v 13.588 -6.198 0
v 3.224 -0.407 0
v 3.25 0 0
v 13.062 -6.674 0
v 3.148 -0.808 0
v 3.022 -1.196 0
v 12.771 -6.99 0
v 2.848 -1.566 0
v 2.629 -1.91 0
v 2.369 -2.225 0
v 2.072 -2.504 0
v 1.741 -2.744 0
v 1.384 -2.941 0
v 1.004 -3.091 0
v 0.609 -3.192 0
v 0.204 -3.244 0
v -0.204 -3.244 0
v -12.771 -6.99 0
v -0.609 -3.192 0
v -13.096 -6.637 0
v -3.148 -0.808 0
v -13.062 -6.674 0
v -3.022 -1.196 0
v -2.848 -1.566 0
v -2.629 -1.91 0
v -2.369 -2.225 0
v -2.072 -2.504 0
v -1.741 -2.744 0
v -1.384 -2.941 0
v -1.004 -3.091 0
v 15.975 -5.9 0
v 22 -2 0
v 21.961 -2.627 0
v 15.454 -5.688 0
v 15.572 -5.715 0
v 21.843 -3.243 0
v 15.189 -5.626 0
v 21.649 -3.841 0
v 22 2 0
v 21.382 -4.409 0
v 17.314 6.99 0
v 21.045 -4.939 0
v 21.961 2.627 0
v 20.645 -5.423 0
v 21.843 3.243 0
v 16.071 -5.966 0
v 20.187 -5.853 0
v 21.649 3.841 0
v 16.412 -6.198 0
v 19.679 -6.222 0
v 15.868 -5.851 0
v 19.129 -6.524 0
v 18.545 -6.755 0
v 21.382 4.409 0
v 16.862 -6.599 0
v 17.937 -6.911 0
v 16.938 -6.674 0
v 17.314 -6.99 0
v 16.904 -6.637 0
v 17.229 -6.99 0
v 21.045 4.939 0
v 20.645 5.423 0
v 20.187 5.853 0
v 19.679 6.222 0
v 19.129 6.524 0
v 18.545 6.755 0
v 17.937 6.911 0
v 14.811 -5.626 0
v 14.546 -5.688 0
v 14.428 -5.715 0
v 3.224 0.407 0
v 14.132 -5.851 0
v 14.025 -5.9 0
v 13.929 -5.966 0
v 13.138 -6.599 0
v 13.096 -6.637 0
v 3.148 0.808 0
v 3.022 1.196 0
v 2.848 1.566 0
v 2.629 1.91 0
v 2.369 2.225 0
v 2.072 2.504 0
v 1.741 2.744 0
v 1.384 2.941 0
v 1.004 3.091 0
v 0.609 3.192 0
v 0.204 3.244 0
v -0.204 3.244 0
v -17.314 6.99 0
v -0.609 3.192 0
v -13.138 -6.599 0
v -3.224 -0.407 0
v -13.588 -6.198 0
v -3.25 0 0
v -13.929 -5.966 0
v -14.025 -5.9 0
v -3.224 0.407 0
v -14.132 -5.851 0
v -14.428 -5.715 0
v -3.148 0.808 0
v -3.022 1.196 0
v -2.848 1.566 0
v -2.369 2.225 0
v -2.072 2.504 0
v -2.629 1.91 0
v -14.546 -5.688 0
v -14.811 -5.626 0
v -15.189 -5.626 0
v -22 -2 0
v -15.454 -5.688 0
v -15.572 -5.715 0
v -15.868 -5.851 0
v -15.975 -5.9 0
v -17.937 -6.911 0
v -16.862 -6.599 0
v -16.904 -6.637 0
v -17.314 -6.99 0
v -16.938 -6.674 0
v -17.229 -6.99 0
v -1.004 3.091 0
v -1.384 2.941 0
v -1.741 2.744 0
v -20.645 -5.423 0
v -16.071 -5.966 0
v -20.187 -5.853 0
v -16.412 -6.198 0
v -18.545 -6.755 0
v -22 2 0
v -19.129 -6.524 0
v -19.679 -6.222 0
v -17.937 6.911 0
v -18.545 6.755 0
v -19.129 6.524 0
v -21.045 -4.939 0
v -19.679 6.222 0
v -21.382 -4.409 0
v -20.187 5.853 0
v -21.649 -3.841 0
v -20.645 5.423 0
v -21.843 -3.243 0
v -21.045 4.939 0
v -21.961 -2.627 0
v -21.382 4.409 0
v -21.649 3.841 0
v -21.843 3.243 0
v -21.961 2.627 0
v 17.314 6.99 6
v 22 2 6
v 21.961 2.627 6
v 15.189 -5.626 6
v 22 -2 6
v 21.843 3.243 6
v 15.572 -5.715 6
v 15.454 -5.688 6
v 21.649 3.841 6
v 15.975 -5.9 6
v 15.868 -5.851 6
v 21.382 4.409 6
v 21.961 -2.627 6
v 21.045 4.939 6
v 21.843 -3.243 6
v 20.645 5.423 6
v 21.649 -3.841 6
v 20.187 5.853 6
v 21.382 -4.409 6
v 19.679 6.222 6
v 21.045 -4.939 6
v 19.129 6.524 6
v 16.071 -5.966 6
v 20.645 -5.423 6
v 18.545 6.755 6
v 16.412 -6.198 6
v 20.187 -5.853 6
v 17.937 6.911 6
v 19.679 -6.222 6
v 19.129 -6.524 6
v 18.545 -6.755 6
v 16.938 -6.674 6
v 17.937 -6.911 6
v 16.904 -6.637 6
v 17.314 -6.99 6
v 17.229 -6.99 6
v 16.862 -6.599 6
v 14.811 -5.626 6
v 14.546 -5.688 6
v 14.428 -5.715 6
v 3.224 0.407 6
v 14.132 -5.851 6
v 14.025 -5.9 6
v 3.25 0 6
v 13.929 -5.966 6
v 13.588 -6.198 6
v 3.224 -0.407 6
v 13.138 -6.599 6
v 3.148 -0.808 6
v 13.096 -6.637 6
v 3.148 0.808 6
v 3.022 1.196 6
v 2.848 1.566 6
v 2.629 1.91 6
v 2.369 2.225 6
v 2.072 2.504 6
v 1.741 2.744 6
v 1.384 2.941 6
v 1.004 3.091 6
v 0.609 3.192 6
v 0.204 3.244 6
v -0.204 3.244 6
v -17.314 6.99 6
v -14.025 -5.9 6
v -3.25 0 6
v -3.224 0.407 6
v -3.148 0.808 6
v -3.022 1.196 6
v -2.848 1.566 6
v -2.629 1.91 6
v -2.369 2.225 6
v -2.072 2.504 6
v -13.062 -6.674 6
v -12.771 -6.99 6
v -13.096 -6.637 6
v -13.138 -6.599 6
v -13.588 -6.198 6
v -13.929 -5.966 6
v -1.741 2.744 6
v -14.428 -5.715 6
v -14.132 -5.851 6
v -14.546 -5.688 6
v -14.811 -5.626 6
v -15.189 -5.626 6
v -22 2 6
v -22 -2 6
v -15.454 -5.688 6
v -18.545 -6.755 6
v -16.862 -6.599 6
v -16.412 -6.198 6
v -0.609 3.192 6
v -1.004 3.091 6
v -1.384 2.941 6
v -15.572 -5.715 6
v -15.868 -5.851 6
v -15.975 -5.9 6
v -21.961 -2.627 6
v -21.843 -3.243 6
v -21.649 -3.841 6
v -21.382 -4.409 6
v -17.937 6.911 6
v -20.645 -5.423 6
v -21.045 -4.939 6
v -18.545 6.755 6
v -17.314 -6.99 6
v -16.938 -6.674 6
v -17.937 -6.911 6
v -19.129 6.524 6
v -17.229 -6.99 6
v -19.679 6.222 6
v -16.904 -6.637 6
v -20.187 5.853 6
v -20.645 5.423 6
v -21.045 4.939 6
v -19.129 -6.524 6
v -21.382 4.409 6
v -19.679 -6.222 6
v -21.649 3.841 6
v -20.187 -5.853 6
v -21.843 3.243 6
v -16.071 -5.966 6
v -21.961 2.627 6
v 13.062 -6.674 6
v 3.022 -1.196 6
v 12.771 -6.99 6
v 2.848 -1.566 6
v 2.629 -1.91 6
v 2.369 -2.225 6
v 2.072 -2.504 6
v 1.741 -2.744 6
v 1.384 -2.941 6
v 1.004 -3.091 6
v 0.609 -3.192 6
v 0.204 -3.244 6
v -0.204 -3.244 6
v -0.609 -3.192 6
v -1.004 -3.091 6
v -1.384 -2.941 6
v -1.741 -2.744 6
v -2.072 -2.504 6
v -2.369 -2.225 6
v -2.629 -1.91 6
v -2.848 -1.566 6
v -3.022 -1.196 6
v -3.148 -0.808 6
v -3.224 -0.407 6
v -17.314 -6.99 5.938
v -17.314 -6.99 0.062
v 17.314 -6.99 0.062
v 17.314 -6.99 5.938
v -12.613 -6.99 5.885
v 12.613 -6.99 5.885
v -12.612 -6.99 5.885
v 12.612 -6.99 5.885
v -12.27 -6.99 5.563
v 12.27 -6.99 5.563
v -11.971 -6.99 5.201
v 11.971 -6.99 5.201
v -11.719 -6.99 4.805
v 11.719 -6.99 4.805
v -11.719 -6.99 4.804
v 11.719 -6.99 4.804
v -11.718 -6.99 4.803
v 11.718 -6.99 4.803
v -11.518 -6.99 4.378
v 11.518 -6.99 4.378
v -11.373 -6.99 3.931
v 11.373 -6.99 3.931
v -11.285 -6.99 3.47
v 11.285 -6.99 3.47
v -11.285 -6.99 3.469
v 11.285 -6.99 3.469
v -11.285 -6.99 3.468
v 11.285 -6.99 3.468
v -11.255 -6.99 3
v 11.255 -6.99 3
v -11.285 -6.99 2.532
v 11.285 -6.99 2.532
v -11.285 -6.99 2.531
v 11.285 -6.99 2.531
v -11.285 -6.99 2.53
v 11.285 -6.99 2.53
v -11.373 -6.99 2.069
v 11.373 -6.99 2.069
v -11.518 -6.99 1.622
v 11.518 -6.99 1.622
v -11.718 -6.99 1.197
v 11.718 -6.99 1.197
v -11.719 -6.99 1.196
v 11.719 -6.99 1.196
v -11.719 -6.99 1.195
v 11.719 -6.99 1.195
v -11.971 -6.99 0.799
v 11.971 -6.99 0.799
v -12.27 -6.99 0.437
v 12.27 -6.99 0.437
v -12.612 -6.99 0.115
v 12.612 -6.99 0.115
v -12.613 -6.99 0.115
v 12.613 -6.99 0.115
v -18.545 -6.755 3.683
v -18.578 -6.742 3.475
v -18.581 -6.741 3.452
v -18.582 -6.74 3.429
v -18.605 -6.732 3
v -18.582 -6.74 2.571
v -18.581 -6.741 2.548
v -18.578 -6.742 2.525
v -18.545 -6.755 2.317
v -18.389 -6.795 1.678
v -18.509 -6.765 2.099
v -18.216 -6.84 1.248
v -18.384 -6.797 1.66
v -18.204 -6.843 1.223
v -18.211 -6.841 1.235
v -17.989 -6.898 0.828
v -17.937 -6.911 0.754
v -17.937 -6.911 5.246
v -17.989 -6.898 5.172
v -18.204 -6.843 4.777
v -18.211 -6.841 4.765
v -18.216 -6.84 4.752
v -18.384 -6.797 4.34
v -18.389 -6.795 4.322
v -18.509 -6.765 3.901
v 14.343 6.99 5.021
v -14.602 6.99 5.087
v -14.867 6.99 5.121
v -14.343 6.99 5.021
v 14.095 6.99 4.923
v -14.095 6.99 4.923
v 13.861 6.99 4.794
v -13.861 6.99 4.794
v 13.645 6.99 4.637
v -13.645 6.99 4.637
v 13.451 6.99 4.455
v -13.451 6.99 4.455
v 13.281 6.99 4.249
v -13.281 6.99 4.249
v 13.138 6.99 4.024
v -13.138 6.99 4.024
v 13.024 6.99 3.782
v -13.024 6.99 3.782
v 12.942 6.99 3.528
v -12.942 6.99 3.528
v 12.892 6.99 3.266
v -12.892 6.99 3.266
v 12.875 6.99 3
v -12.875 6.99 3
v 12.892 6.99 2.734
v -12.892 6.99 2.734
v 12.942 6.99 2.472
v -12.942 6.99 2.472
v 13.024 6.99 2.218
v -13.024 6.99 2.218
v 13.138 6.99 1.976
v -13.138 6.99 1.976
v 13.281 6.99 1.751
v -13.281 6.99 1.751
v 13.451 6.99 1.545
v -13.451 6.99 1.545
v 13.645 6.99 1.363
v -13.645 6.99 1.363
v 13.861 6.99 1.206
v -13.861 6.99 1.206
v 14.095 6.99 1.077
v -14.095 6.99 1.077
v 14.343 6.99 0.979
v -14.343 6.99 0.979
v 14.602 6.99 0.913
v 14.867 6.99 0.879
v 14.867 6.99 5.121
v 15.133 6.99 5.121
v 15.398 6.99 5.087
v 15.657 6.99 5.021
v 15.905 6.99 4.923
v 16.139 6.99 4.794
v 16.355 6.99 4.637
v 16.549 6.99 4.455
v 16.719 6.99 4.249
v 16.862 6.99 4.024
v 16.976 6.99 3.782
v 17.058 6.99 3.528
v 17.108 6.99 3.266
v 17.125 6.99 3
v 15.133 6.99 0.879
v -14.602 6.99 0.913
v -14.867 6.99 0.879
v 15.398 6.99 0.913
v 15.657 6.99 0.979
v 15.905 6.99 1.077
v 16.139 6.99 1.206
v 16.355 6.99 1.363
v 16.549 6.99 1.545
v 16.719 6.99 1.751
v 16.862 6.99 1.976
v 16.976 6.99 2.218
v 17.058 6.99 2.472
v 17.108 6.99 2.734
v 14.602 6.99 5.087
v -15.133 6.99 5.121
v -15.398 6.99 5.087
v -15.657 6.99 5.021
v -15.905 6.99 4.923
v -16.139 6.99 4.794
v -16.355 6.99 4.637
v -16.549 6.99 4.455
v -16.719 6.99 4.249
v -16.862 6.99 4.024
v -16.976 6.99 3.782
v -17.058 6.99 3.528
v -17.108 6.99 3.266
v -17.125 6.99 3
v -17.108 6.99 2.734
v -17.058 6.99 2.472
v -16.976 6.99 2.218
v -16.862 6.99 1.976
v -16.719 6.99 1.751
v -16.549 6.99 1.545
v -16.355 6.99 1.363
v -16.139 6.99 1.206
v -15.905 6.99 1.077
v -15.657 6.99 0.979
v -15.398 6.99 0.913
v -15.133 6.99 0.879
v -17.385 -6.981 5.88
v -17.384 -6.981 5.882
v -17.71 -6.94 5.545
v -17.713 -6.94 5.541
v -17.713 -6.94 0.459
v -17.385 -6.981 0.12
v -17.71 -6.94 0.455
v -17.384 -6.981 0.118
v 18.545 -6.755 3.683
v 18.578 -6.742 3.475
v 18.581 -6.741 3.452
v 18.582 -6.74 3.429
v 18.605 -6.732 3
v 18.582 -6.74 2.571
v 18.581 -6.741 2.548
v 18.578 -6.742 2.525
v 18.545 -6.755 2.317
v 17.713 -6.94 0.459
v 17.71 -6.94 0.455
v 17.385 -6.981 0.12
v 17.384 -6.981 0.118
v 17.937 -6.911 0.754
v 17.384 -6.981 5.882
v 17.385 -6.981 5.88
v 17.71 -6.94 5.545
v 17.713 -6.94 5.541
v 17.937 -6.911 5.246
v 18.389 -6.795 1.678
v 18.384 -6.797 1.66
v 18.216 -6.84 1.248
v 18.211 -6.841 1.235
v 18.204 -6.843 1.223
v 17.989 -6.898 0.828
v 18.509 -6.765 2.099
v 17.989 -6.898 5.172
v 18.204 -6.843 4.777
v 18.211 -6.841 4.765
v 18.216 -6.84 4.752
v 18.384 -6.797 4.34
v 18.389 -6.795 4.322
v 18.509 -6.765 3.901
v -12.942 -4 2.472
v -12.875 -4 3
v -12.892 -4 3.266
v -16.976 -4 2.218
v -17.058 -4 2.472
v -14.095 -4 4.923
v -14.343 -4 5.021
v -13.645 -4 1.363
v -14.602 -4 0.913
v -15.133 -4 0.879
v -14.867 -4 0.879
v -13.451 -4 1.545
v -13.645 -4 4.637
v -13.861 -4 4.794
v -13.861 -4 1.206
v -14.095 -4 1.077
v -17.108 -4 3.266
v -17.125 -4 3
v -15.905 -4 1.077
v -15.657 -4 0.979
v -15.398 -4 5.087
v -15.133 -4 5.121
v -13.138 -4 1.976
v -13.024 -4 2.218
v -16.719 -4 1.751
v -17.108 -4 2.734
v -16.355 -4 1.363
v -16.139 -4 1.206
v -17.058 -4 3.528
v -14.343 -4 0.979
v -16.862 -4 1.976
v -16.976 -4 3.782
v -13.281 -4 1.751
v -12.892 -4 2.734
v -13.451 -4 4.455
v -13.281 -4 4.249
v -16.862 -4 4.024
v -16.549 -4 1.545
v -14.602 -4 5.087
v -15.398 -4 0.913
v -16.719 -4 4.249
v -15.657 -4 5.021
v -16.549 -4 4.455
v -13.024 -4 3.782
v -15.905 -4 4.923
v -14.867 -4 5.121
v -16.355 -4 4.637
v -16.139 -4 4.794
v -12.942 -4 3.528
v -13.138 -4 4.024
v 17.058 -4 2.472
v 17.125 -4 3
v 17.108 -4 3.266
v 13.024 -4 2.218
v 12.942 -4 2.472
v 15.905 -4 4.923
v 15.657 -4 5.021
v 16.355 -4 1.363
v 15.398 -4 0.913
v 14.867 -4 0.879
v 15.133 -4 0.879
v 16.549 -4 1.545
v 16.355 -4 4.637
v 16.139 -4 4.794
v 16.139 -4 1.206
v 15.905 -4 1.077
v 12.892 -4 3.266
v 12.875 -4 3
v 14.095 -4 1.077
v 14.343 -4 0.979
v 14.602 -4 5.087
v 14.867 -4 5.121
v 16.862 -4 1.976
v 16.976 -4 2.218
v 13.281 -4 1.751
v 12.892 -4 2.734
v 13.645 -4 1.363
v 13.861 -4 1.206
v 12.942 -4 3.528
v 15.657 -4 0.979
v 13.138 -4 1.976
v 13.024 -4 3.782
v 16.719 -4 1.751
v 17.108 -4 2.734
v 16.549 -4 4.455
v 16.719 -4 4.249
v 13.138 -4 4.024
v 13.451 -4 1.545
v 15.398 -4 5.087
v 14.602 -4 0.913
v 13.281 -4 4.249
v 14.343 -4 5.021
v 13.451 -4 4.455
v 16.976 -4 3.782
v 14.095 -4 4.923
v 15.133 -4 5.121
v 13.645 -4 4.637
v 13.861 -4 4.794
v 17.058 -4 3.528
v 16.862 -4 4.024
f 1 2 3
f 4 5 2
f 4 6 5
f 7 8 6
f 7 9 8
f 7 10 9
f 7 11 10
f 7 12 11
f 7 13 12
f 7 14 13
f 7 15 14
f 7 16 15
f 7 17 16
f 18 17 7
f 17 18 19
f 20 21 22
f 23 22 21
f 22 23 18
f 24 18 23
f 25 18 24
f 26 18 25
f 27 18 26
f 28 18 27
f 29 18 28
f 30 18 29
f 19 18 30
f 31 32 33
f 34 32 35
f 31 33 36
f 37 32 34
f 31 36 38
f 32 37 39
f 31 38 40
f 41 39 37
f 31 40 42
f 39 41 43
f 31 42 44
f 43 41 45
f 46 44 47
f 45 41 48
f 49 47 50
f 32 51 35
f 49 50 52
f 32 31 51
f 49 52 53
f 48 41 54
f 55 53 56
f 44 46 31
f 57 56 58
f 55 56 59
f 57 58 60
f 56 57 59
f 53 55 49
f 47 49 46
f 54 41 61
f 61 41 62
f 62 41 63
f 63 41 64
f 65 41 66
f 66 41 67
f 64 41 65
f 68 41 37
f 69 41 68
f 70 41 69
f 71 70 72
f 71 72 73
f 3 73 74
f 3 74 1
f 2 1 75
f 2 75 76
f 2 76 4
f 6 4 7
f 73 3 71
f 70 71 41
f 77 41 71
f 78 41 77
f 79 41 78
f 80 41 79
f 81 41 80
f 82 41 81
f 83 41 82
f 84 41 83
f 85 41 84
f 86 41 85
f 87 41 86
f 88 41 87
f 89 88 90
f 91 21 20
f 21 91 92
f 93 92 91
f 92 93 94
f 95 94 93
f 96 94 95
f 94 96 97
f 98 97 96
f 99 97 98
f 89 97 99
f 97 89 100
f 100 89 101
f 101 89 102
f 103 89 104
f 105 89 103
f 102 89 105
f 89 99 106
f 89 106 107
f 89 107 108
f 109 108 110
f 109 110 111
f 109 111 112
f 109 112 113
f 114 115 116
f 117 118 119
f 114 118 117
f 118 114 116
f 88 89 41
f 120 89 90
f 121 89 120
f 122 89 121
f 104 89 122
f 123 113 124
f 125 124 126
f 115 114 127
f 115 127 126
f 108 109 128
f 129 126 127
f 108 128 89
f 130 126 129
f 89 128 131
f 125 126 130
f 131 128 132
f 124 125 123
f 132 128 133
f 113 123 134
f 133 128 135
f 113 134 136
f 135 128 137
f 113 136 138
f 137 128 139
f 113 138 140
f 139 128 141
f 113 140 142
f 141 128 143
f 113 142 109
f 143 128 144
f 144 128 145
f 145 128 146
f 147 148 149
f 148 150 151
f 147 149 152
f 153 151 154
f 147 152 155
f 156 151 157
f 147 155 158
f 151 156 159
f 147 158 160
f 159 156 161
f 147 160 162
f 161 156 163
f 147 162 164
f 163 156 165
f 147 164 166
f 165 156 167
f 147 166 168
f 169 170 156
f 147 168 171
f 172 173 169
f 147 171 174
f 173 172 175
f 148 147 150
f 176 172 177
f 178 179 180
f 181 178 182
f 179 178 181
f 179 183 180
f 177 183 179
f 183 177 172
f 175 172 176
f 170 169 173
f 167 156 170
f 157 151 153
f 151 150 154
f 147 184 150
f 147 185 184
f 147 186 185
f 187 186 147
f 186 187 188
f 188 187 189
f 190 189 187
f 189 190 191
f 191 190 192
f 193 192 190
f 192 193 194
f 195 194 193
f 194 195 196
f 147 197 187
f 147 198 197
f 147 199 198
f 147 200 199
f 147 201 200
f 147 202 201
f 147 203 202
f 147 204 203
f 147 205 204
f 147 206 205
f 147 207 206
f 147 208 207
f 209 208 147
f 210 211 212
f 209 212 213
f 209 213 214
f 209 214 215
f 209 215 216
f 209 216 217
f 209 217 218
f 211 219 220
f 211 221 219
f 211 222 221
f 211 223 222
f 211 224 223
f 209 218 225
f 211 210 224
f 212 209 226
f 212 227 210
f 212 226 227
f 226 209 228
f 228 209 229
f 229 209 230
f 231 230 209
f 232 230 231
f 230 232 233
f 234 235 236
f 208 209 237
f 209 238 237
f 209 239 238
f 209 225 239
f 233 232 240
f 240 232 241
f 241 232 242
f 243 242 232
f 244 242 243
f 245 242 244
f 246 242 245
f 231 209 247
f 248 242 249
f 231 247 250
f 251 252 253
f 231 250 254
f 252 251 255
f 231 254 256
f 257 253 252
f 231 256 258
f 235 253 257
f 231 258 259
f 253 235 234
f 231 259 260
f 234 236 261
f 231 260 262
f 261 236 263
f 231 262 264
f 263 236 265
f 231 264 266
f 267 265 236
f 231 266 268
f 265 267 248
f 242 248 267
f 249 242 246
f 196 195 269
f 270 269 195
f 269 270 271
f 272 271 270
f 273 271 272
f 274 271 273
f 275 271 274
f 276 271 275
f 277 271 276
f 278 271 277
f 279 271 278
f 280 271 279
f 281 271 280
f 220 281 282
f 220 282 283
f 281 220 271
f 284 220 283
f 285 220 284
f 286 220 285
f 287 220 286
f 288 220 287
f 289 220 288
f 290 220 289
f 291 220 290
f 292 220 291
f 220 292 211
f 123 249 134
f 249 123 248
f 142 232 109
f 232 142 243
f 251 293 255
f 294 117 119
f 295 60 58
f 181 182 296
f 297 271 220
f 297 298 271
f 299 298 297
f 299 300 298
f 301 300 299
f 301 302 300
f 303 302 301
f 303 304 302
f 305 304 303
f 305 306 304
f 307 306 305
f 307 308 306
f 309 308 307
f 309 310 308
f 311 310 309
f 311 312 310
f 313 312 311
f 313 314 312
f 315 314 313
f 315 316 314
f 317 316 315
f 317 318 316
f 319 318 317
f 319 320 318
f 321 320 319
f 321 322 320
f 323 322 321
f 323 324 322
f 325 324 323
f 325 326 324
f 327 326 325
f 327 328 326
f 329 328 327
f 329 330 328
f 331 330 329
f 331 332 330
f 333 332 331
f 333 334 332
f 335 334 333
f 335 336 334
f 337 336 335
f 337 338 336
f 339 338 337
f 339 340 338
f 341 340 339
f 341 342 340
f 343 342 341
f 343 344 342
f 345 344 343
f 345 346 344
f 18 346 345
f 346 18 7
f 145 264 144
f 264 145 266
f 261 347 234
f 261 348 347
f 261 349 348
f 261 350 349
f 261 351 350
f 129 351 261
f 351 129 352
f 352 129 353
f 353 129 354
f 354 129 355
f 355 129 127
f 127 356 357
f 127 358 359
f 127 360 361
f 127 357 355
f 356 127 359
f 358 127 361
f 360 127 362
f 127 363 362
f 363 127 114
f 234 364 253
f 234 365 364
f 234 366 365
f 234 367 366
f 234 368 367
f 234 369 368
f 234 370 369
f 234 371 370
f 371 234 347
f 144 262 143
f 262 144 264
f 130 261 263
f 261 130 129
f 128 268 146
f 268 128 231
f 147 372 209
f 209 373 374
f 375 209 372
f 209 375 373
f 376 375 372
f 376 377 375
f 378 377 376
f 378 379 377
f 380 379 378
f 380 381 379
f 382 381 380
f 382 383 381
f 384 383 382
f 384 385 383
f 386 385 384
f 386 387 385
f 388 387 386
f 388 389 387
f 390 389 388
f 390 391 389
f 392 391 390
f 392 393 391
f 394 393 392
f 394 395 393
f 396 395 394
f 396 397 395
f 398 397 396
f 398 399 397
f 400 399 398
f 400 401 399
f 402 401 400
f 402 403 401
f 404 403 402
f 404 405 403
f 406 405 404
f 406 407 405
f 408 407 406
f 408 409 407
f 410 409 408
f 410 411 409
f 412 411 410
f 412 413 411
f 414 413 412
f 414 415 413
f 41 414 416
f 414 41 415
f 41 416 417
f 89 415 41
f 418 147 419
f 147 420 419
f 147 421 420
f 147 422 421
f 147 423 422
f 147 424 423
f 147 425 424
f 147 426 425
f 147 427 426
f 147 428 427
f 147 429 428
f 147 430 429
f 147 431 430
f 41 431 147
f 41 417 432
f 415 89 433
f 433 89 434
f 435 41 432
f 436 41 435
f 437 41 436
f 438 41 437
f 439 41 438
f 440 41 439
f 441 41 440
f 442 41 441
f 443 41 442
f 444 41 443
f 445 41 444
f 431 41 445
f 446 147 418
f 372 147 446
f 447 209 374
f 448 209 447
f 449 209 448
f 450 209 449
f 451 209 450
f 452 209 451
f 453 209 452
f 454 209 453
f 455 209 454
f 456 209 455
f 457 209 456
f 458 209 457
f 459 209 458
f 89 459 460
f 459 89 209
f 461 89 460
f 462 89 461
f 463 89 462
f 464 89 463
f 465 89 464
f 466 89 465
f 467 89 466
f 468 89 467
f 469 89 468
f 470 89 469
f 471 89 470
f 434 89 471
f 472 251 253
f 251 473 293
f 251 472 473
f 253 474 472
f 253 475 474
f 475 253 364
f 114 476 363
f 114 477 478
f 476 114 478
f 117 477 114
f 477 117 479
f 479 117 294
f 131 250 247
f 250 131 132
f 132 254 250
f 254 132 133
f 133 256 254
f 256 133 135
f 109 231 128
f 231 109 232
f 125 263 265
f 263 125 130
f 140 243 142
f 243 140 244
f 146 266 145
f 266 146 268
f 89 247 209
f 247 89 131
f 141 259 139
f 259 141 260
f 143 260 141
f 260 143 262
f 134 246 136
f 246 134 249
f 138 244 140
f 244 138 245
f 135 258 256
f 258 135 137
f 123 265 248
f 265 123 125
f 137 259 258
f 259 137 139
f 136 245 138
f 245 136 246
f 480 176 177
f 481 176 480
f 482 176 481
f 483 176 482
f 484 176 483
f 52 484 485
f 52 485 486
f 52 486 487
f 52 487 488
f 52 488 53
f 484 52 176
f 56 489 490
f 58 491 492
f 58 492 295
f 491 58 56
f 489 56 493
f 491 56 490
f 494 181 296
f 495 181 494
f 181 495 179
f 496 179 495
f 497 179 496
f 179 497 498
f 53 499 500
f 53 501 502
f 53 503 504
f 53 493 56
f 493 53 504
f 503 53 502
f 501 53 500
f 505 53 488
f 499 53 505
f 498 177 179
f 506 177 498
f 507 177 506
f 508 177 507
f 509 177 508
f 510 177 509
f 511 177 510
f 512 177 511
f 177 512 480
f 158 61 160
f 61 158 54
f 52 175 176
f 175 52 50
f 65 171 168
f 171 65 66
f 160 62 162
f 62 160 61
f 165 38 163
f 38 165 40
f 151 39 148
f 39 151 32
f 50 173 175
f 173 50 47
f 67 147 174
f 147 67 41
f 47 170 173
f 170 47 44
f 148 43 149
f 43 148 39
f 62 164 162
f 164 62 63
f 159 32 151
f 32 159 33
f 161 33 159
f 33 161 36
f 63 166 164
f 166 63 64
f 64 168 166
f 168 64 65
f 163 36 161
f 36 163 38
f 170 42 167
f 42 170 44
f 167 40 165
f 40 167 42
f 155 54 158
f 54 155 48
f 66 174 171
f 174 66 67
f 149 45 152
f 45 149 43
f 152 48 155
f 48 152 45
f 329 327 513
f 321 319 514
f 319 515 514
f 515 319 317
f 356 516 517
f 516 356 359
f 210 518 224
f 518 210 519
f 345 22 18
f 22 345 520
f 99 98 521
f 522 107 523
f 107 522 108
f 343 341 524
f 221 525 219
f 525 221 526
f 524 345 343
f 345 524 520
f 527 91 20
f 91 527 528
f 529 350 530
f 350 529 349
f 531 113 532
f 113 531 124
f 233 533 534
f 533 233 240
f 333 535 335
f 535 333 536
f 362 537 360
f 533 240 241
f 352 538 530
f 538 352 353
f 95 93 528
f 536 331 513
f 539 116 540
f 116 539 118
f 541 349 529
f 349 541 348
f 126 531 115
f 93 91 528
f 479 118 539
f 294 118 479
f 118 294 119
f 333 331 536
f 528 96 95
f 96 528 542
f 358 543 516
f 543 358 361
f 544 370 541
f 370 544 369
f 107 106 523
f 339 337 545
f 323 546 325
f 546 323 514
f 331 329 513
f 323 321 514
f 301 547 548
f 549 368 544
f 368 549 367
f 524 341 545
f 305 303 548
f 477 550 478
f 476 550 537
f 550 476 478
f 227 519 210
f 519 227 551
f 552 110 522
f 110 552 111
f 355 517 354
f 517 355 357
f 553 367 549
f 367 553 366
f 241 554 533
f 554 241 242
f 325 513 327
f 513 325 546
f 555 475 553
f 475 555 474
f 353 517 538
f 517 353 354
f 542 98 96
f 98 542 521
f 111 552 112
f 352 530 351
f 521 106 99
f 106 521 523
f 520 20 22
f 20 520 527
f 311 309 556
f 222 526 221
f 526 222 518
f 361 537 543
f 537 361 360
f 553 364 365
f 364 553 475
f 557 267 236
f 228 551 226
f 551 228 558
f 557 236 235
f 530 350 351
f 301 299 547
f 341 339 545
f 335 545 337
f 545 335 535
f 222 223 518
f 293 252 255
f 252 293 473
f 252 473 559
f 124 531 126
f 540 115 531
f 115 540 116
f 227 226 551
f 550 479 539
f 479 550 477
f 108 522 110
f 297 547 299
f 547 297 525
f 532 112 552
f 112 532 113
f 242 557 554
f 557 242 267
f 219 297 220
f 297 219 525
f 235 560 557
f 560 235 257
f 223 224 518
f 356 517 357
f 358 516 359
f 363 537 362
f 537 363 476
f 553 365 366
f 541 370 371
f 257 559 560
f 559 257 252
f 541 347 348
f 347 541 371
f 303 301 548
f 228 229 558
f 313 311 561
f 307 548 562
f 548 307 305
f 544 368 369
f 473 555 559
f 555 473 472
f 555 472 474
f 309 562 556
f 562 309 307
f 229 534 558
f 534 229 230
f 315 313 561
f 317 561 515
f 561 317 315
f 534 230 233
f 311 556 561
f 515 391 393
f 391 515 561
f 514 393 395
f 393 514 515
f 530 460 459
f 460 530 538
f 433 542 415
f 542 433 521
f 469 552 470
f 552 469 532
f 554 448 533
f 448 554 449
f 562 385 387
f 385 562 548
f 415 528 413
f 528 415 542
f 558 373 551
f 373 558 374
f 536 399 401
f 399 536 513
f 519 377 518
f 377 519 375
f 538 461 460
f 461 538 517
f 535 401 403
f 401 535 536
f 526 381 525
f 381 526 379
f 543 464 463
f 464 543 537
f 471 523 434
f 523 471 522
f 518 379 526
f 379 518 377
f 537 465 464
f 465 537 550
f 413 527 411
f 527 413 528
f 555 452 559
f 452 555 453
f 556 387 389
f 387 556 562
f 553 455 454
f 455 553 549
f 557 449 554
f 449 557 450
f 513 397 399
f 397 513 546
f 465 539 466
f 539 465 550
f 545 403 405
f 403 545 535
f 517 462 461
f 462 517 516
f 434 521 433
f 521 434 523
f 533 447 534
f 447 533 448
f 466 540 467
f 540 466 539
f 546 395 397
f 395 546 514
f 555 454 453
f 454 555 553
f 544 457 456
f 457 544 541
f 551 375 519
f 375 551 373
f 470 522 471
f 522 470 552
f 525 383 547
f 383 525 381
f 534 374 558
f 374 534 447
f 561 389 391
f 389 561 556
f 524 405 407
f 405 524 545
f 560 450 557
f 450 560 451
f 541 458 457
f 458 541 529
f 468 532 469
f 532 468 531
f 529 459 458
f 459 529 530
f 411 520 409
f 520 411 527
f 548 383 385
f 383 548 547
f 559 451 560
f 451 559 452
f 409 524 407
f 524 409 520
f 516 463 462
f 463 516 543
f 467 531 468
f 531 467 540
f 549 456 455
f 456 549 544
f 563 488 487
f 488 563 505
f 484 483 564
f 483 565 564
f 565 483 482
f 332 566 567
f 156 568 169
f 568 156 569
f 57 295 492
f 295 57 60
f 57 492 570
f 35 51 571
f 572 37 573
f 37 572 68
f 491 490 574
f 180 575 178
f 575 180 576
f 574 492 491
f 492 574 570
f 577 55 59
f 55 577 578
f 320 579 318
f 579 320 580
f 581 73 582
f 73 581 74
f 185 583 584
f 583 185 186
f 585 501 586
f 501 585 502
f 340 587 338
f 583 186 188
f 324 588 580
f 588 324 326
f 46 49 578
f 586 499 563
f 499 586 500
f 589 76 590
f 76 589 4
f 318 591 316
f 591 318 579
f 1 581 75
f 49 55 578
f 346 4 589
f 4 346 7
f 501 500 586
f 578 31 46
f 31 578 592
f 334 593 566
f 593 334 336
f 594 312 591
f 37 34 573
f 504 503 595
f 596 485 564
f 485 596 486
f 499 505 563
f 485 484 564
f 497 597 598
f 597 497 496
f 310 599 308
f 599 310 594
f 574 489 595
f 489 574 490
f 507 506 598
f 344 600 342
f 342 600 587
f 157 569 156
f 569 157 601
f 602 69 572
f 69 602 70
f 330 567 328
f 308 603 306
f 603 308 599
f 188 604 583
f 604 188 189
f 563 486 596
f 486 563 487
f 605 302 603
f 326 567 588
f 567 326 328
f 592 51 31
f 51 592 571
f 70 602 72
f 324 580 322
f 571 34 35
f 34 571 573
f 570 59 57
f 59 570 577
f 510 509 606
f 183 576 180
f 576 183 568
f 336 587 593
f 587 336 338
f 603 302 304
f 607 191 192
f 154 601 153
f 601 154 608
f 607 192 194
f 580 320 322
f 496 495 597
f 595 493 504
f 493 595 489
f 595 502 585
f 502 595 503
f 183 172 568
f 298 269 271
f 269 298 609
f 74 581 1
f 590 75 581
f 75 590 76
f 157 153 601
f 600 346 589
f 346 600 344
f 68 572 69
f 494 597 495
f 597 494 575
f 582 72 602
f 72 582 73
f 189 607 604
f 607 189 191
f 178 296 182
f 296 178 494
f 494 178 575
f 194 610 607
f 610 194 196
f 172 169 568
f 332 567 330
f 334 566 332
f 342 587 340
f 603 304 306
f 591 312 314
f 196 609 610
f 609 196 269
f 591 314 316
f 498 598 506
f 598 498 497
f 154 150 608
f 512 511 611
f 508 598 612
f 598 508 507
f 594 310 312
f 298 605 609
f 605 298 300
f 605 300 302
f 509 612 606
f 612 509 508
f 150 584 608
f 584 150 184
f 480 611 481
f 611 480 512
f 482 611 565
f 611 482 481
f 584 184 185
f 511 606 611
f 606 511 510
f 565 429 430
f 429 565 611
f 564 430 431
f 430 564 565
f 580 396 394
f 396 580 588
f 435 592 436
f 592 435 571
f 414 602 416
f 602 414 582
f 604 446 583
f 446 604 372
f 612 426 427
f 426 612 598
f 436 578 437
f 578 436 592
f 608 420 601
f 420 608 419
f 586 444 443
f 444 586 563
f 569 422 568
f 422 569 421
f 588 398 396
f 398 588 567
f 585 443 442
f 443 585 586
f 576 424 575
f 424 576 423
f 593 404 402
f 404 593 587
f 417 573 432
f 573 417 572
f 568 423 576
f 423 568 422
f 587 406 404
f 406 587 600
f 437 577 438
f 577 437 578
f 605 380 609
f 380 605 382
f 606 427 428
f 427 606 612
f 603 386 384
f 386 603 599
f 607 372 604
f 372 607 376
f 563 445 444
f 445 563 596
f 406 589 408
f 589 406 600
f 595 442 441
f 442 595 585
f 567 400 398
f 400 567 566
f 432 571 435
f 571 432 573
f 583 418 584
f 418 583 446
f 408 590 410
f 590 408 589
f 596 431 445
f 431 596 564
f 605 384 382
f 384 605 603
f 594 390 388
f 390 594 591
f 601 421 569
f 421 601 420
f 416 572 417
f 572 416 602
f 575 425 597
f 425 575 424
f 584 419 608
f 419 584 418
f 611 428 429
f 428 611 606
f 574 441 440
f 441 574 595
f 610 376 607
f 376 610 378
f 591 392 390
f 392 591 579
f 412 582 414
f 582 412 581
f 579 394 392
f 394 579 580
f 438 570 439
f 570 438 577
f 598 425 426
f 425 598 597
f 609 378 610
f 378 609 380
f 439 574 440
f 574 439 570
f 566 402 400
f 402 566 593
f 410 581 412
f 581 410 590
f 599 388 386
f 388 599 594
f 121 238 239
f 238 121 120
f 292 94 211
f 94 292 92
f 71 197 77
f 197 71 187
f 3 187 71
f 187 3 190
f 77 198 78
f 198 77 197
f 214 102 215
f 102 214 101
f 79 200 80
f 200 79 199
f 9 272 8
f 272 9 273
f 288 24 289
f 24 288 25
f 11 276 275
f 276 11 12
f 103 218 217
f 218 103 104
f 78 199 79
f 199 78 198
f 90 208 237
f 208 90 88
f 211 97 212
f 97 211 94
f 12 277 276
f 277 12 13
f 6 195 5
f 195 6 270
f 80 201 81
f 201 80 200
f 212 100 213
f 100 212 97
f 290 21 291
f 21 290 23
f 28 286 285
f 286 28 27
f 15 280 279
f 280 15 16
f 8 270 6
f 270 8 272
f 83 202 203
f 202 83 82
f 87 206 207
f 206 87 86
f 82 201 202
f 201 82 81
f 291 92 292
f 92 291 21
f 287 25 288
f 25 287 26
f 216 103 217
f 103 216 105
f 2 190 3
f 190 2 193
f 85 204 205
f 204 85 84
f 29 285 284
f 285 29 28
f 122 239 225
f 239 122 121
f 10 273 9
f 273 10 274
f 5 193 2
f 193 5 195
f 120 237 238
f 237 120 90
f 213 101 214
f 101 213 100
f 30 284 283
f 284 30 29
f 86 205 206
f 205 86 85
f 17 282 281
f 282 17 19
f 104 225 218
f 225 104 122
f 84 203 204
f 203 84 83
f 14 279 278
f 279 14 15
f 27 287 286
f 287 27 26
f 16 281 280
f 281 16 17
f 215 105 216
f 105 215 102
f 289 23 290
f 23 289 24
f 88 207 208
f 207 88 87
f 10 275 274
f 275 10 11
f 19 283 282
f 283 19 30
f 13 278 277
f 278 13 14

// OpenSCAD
$fn = 50;


difference() {
	union() {
		cylinder(h = 6, r = 7.0000000000);
		translate(v = [-7.5000000000, 0.0000000000, 0]) {
			hull() {
				translate(v = [-9.5000000000, 2.0000000000, 0]) {
					cylinder(h = 6, r = 5);
				}
				translate(v = [9.5000000000, 2.0000000000, 0]) {
					cylinder(h = 6, r = 5);
				}
				translate(v = [-9.5000000000, -2.0000000000, 0]) {
					cylinder(h = 6, r = 5);
				}
				translate(v = [9.5000000000, -2.0000000000, 0]) {
					cylinder(h = 6, r = 5);
				}
			}
		}
		translate(v = [-7.5000000000, 0.0000000000, 0]) {
			hull() {
				translate(v = [-9.5000000000, 2.0000000000, 0]) {
					cylinder(h = 6, r = 5);
				}
				translate(v = [9.5000000000, 2.0000000000, 0]) {
					cylinder(h = 6, r = 5);
				}
				translate(v = [-9.5000000000, -2.0000000000, 0]) {
					cylinder(h = 6, r = 5);
				}
				translate(v = [9.5000000000, -2.0000000000, 0]) {
					cylinder(h = 6, r = 5);
				}
			}
		}
		translate(v = [7.5000000000, 0.0000000000, 0]) {
			hull() {
				translate(v = [-9.5000000000, 2.0000000000, 0]) {
					cylinder(h = 6, r = 5);
				}
				translate(v = [9.5000000000, 2.0000000000, 0]) {
					cylinder(h = 6, r = 5);
				}
				translate(v = [-9.5000000000, -2.0000000000, 0]) {
					cylinder(h = 6, r = 5);
				}
				translate(v = [9.5000000000, -2.0000000000, 0]) {
					cylinder(h = 6, r = 5);
				}
			}
		}
		translate(v = [7.5000000000, 0.0000000000, 0]) {
			hull() {
				translate(v = [-9.5000000000, 2.0000000000, 0]) {
					cylinder(h = 6, r = 5);
				}
				translate(v = [9.5000000000, 2.0000000000, 0]) {
					cylinder(h = 6, r = 5);
				}
				translate(v = [-9.5000000000, -2.0000000000, 0]) {
					cylinder(h = 6, r = 5);
				}
				translate(v = [9.5000000000, -2.0000000000, 0]) {
					cylinder(h = 6, r = 5);
				}
			}
		}
	}
	union() {
		translate(v = [-15.0000000000, -7.0000000000, 3.0000000000]) {
			rotate(a = [90, 0, 0]) {
				difference() {
					union() {
						#translate(v = [0, 0, -14.0000000000]) {
							cylinder(h = 14, r = 2.0000000000);
						}
						#translate(v = [0, 0, -3]) {
							cylinder(h = 3, r1 = 2.1250000000, r2 = 3.7500000000);
						}
						#translate(v = [0, 0, -14.0000000000]) {
							cylinder(h = 14, r = 2.1250000000);
						}
						#translate(v = [0, 0, -14.0000000000]) {
							cylinder(h = 14, r = 2.0000000000);
						}
					}
					union();
				}
			}
		}
		translate(v = [15.0000000000, -7.0000000000, 3.0000000000]) {
			rotate(a = [90, 0, 0]) {
				difference() {
					union() {
						#translate(v = [0, 0, -14.0000000000]) {
							cylinder(h = 14, r = 2.0000000000);
						}
						#translate(v = [0, 0, -3]) {
							cylinder(h = 3, r1 = 2.1250000000, r2 = 3.7500000000);
						}
						#translate(v = [0, 0, -14.0000000000]) {
							cylinder(h = 14, r = 2.1250000000);
						}
						#translate(v = [0, 0, -14.0000000000]) {
							cylinder(h = 14, r = 2.0000000000);
						}
					}
					union();
				}
			}
		}
		translate(v = [0, 0, -100]) {
			cylinder(h = 200, r = 3.2500000000);
		}
		translate(v = [0, 0, -100]) {
			cylinder(h = 200, r = 1.8000000000);
		}
	}
}
